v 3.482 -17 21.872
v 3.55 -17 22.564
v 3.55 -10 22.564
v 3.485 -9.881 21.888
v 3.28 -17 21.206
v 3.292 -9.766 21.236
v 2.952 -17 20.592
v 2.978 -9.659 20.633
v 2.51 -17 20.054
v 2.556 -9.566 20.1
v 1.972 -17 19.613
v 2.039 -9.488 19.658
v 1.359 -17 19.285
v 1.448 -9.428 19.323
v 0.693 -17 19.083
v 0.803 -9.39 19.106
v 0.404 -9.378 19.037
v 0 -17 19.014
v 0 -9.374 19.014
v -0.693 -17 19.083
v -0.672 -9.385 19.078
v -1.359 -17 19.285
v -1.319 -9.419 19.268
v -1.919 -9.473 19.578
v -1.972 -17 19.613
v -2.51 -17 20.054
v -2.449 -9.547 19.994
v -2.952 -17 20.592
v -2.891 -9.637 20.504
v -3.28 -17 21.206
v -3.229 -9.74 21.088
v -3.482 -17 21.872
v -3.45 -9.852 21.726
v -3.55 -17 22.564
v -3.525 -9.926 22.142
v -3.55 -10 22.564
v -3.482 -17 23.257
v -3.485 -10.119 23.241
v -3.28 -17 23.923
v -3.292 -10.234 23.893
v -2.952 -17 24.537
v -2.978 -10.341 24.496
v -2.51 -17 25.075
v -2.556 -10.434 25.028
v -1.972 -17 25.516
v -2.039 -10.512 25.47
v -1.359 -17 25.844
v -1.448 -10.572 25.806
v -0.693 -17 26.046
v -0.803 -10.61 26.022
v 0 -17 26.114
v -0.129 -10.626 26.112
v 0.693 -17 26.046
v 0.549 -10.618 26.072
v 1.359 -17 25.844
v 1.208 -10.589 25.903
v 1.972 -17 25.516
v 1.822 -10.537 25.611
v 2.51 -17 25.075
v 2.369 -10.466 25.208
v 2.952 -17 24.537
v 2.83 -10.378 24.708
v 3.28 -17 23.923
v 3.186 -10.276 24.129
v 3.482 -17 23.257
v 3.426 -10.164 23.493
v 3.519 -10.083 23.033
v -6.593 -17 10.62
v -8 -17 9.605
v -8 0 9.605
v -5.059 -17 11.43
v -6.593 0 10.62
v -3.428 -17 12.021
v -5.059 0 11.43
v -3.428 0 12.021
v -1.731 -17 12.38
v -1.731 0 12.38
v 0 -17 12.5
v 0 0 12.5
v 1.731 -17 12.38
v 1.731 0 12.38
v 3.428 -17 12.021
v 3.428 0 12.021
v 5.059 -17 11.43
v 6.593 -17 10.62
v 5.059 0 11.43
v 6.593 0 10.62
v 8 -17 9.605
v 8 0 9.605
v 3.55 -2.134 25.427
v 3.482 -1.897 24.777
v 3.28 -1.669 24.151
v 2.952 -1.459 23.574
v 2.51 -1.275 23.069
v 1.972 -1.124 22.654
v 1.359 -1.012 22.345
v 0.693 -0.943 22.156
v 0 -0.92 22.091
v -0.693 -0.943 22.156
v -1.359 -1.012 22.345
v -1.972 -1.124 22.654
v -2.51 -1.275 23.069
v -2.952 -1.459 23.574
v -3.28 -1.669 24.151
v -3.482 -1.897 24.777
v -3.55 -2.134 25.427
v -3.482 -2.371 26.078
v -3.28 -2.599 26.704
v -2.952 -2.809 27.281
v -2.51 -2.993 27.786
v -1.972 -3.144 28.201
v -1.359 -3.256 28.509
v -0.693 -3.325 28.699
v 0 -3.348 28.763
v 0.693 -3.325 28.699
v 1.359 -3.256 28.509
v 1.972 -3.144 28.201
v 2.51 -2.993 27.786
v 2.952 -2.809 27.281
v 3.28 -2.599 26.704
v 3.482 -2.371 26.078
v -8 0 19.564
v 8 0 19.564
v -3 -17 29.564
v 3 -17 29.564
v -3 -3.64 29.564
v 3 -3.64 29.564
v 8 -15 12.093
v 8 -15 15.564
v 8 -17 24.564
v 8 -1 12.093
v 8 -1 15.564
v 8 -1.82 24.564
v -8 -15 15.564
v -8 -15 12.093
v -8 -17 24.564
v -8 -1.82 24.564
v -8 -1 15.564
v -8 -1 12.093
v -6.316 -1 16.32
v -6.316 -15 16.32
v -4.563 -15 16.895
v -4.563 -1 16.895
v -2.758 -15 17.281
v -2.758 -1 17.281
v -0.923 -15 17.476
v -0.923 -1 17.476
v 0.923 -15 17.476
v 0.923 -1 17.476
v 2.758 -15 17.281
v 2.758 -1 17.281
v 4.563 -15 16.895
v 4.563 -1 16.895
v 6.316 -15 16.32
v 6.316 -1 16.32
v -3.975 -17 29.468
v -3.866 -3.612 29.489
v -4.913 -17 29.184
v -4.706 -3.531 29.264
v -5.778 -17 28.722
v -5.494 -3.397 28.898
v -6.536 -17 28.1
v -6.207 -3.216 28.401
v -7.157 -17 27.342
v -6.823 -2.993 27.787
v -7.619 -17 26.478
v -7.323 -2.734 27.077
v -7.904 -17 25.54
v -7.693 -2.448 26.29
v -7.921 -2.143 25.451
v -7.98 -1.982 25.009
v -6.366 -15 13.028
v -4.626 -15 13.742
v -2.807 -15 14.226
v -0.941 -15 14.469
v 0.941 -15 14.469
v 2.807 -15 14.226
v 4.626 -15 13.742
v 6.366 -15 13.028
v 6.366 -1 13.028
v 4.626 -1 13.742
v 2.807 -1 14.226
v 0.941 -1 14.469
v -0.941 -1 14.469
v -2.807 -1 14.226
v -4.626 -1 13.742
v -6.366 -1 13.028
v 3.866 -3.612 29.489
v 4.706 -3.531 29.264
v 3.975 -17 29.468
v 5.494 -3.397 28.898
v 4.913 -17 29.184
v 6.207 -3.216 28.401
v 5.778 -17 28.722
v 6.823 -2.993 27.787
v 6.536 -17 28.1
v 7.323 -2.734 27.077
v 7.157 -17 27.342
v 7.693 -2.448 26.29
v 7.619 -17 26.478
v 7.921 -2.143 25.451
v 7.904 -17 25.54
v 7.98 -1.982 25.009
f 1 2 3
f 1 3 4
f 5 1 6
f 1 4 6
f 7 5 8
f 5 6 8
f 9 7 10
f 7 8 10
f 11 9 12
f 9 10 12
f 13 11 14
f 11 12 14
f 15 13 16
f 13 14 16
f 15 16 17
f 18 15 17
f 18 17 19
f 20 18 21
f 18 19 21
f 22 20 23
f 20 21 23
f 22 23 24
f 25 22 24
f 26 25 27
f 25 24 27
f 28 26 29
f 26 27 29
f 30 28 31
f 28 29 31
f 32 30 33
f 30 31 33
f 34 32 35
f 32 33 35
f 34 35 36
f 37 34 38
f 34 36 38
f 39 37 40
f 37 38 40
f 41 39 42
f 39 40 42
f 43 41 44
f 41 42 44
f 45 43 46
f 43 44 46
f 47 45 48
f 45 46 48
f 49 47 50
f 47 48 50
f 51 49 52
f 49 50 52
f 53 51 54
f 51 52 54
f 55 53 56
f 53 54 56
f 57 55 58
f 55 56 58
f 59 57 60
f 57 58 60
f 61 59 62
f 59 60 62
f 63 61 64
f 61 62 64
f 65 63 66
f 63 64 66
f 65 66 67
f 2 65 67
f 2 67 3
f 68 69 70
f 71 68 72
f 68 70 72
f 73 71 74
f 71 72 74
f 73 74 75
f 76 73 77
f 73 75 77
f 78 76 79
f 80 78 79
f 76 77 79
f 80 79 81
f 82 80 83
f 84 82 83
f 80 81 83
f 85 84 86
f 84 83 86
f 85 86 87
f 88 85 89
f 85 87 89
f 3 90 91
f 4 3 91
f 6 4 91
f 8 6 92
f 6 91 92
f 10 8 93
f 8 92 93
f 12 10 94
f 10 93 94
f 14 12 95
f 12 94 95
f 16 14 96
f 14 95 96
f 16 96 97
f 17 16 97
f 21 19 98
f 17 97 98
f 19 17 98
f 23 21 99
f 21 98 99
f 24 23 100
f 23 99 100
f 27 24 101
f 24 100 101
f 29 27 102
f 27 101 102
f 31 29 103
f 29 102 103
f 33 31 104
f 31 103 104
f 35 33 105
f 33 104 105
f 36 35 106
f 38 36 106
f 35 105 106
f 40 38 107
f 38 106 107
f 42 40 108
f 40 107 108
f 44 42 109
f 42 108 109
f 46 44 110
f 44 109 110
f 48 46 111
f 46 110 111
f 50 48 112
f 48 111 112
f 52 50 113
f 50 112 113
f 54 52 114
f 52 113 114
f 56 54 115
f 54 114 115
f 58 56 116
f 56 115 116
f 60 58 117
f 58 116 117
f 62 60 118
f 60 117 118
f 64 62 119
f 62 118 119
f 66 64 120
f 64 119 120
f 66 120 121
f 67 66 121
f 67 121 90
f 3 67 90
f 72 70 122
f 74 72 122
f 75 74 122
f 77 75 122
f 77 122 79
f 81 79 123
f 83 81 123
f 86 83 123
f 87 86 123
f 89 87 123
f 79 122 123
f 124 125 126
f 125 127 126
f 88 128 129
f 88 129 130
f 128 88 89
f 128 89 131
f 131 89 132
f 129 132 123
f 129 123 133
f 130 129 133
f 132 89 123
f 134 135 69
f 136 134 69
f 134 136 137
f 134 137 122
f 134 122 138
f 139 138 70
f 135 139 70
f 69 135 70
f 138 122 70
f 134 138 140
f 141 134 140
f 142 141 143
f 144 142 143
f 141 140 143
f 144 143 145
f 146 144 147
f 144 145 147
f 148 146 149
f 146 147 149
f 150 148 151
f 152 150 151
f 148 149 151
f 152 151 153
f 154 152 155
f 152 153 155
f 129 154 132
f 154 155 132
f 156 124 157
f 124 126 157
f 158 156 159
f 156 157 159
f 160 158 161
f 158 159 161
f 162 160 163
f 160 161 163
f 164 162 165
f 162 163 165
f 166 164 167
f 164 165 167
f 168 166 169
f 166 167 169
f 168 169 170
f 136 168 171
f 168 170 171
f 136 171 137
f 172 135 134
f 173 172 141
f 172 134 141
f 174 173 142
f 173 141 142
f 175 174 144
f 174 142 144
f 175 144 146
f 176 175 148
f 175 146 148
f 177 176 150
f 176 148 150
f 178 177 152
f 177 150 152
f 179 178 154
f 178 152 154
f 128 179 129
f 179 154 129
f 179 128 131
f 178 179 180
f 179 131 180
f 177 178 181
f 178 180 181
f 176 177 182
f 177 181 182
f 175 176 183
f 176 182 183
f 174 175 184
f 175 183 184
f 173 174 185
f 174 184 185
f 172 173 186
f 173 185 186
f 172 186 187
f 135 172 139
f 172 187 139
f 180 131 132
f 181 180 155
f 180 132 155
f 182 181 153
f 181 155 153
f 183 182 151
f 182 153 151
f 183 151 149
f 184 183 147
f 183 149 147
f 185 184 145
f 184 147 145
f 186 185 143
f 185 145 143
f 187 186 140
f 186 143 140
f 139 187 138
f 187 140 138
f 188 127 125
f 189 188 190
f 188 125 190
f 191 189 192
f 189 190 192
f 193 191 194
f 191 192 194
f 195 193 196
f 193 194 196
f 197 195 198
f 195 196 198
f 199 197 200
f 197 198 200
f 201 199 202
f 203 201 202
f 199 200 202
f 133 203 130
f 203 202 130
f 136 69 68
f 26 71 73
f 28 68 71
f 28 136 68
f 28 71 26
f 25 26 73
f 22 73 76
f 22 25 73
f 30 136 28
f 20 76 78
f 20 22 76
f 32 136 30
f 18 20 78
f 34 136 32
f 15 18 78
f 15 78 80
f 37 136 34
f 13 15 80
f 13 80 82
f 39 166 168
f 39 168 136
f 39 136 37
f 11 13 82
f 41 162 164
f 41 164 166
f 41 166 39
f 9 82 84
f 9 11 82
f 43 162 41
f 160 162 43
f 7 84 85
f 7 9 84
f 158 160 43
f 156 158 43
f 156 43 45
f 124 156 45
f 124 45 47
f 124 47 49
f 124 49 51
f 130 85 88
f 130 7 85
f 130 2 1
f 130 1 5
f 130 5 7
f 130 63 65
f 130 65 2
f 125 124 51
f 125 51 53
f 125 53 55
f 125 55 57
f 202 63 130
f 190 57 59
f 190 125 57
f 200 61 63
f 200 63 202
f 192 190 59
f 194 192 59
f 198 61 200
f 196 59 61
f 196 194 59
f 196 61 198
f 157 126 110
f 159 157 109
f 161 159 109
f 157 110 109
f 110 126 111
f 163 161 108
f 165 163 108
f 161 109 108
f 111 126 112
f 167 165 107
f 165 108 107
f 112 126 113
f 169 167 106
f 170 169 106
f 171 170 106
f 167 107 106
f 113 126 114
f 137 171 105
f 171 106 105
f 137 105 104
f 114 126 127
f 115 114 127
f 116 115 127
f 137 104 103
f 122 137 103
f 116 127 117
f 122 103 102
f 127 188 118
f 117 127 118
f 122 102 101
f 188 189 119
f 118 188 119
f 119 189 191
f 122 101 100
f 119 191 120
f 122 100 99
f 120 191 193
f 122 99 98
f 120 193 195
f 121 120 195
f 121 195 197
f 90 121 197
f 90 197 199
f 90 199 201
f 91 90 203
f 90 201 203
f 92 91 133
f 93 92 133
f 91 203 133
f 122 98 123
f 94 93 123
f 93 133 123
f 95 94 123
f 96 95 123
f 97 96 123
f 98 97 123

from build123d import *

# Parameters (mm, degrees)
F1_DEPTH  = 15
F3_DEPTH  = 2
F5_R      = 3.55
F8_DEPTH  = 25
F11_DEPTH = 1
F12_R     = 5


with BuildPart() as f1:
    # F0 (on Front) → F1 (new body)
    with BuildSketch(Plane.XZ):
        with BuildLine():
            ThreePointArc((-8, 9.6046863561), (0, 12.5), (8, 9.6046863561))
            Line((8, 9.6046863561), (8, 12.0933866224))
            ThreePointArc((8, 12.0933866224), (0, 14.5), (-8, 12.0933866224))
            Line((-8, 12.0933866224), (-8, 9.6046863561))
        make_face()
    extrude(amount=F1_DEPTH)


with BuildPart() as f1b:
    # F0 (on Front) → F1, piece 2 (new body)
    with BuildSketch(Plane.XZ):
        with BuildLine():
            ThreePointArc((-8, 15.5643824163), (0, 17.5), (8, 15.5643824163))
            Line((8, 15.5643824163), (8, 29.5643824163))
            Line((8, 29.5643824163), (-8, 29.5643824163))
            Line((-8, 29.5643824163), (-8, 15.5643824163))
        make_face()
    extrude(amount=F1_DEPTH)


with BuildPart() as f3:
    # F2 (on face) → F3 (new body)
    with BuildSketch(Plane.XZ.offset(15)):
        with BuildLine():
            ThreePointArc((-8, 9.6046863561), (0, 12.5), (8, 9.6046863561))
            Line((8, 9.6046863561), (8, 12.0933866224))
            ThreePointArc((8, 12.0933866224), (0, 14.5), (-8, 12.0933866224))
            Line((-8, 12.0933866224), (-8, 9.6046863561))
        make_face()
        with BuildLine():
            ThreePointArc((-8, 12.0933866224), (0, 14.5), (8, 12.0933866224))
            Line((8, 12.0933866224), (8, 15.5643824163))
            ThreePointArc((8, 15.5643824163), (0, 17.5), (-8, 15.5643824163))
            Line((-8, 15.5643824163), (-8, 12.0933866224))
        make_face()
        with BuildLine():
            ThreePointArc((-8, 15.5643824163), (0, 17.5), (8, 15.5643824163))
            Line((8, 15.5643824163), (8, 29.5643824163))
            Line((8, 29.5643824163), (-8, 29.5643824163))
            Line((-8, 29.5643824163), (-8, 15.5643824163))
        make_face()
    extrude(amount=F3_DEPTH)


with BuildPart() as f6_tool:
    # F6: sweep along a path in F4
    with BuildLine(Plane.YZ.offset(8)) as f6_path:
        Line((-16, 22.5643824163), (-10, 22.5643824163))
        Line((-10, 22.5643824163), (0, 26.2040847589))
        Line((0, 26.2040847589), (4.1724268391, 27.722723933))
    # F5 (on face) → F6 (sweep)
    with BuildSketch(Plane.XZ.offset(17)):
        with Locations((0, 22.5643824163)):
            Circle(F5_R)
    sweep(path=f6_path.line, transition=Transition.RIGHT)


with BuildPart() as f1b_1:
    add(f1b.part)

    # F6: cut by f6_tool
    add(f6_tool.part, mode=Mode.SUBTRACT)

    # F7 (on face) → F8 (cut)
    with BuildSketch(Plane.YZ.offset(8)):
        Polygon((-3.6397023427, 29.5643824163), (0, 19.5643824163), (0, 29.5643824163), align=None)
    extrude(amount=-F8_DEPTH, mode=Mode.SUBTRACT)


with BuildPart() as f3_1:
    add(f3.part)

    # F6: cut by f6_tool
    add(f6_tool.part, mode=Mode.SUBTRACT)


with BuildPart() as f1_1:
    add(f1.part)

    # F9: union F1b, F3
    add(f1b_1.part)
    add(f3_1.part)

    # F10 (on face) → F11 (join)
    with BuildSketch(Plane(origin=(0, 0, 0), x_dir=(-1, 0, 0), z_dir=(0, 1, 0))):
        with BuildLine():
            ThreePointArc((8, 12.0933866224), (0, 14.5), (-8, 12.0933866224))
            Line((-8, 12.0933866224), (-8, 9.6046863561))
            ThreePointArc((-8, 9.6046863561), (0, 12.5), (8, 9.6046863561))
            Line((8, 9.6046863561), (8, 12.0933866224))
        make_face()
        with BuildLine():
            Line((-8, 15.5643824163), (-8, 12.0933866224))
            ThreePointArc((-8, 12.0933866224), (0, 14.5), (8, 12.0933866224))
            Line((8, 12.0933866224), (8, 15.5643824163))
            ThreePointArc((8, 15.5643824163), (0, 17.5), (-8, 15.5643824163))
        make_face()
        with BuildLine():
            Line((-8, 19.5643824163), (-8, 15.5643824163))
            ThreePointArc((-8, 15.5643824163), (0, 17.5), (8, 15.5643824163))
            Line((8, 15.5643824163), (8, 19.5643824163))
            Line((8, 19.5643824163), (-8, 19.5643824163))
        make_face()
    extrude(amount=-F11_DEPTH)

    # F12
    f12_edges = [f1_1.edges().sort_by_distance(p)[0] for p in [
        (8, -10.319851, 29.564382),
        (-8, -10.319851, 29.564382),
    ]]
    fillet(f12_edges, radius=F12_R)


solid = f1_1.part
